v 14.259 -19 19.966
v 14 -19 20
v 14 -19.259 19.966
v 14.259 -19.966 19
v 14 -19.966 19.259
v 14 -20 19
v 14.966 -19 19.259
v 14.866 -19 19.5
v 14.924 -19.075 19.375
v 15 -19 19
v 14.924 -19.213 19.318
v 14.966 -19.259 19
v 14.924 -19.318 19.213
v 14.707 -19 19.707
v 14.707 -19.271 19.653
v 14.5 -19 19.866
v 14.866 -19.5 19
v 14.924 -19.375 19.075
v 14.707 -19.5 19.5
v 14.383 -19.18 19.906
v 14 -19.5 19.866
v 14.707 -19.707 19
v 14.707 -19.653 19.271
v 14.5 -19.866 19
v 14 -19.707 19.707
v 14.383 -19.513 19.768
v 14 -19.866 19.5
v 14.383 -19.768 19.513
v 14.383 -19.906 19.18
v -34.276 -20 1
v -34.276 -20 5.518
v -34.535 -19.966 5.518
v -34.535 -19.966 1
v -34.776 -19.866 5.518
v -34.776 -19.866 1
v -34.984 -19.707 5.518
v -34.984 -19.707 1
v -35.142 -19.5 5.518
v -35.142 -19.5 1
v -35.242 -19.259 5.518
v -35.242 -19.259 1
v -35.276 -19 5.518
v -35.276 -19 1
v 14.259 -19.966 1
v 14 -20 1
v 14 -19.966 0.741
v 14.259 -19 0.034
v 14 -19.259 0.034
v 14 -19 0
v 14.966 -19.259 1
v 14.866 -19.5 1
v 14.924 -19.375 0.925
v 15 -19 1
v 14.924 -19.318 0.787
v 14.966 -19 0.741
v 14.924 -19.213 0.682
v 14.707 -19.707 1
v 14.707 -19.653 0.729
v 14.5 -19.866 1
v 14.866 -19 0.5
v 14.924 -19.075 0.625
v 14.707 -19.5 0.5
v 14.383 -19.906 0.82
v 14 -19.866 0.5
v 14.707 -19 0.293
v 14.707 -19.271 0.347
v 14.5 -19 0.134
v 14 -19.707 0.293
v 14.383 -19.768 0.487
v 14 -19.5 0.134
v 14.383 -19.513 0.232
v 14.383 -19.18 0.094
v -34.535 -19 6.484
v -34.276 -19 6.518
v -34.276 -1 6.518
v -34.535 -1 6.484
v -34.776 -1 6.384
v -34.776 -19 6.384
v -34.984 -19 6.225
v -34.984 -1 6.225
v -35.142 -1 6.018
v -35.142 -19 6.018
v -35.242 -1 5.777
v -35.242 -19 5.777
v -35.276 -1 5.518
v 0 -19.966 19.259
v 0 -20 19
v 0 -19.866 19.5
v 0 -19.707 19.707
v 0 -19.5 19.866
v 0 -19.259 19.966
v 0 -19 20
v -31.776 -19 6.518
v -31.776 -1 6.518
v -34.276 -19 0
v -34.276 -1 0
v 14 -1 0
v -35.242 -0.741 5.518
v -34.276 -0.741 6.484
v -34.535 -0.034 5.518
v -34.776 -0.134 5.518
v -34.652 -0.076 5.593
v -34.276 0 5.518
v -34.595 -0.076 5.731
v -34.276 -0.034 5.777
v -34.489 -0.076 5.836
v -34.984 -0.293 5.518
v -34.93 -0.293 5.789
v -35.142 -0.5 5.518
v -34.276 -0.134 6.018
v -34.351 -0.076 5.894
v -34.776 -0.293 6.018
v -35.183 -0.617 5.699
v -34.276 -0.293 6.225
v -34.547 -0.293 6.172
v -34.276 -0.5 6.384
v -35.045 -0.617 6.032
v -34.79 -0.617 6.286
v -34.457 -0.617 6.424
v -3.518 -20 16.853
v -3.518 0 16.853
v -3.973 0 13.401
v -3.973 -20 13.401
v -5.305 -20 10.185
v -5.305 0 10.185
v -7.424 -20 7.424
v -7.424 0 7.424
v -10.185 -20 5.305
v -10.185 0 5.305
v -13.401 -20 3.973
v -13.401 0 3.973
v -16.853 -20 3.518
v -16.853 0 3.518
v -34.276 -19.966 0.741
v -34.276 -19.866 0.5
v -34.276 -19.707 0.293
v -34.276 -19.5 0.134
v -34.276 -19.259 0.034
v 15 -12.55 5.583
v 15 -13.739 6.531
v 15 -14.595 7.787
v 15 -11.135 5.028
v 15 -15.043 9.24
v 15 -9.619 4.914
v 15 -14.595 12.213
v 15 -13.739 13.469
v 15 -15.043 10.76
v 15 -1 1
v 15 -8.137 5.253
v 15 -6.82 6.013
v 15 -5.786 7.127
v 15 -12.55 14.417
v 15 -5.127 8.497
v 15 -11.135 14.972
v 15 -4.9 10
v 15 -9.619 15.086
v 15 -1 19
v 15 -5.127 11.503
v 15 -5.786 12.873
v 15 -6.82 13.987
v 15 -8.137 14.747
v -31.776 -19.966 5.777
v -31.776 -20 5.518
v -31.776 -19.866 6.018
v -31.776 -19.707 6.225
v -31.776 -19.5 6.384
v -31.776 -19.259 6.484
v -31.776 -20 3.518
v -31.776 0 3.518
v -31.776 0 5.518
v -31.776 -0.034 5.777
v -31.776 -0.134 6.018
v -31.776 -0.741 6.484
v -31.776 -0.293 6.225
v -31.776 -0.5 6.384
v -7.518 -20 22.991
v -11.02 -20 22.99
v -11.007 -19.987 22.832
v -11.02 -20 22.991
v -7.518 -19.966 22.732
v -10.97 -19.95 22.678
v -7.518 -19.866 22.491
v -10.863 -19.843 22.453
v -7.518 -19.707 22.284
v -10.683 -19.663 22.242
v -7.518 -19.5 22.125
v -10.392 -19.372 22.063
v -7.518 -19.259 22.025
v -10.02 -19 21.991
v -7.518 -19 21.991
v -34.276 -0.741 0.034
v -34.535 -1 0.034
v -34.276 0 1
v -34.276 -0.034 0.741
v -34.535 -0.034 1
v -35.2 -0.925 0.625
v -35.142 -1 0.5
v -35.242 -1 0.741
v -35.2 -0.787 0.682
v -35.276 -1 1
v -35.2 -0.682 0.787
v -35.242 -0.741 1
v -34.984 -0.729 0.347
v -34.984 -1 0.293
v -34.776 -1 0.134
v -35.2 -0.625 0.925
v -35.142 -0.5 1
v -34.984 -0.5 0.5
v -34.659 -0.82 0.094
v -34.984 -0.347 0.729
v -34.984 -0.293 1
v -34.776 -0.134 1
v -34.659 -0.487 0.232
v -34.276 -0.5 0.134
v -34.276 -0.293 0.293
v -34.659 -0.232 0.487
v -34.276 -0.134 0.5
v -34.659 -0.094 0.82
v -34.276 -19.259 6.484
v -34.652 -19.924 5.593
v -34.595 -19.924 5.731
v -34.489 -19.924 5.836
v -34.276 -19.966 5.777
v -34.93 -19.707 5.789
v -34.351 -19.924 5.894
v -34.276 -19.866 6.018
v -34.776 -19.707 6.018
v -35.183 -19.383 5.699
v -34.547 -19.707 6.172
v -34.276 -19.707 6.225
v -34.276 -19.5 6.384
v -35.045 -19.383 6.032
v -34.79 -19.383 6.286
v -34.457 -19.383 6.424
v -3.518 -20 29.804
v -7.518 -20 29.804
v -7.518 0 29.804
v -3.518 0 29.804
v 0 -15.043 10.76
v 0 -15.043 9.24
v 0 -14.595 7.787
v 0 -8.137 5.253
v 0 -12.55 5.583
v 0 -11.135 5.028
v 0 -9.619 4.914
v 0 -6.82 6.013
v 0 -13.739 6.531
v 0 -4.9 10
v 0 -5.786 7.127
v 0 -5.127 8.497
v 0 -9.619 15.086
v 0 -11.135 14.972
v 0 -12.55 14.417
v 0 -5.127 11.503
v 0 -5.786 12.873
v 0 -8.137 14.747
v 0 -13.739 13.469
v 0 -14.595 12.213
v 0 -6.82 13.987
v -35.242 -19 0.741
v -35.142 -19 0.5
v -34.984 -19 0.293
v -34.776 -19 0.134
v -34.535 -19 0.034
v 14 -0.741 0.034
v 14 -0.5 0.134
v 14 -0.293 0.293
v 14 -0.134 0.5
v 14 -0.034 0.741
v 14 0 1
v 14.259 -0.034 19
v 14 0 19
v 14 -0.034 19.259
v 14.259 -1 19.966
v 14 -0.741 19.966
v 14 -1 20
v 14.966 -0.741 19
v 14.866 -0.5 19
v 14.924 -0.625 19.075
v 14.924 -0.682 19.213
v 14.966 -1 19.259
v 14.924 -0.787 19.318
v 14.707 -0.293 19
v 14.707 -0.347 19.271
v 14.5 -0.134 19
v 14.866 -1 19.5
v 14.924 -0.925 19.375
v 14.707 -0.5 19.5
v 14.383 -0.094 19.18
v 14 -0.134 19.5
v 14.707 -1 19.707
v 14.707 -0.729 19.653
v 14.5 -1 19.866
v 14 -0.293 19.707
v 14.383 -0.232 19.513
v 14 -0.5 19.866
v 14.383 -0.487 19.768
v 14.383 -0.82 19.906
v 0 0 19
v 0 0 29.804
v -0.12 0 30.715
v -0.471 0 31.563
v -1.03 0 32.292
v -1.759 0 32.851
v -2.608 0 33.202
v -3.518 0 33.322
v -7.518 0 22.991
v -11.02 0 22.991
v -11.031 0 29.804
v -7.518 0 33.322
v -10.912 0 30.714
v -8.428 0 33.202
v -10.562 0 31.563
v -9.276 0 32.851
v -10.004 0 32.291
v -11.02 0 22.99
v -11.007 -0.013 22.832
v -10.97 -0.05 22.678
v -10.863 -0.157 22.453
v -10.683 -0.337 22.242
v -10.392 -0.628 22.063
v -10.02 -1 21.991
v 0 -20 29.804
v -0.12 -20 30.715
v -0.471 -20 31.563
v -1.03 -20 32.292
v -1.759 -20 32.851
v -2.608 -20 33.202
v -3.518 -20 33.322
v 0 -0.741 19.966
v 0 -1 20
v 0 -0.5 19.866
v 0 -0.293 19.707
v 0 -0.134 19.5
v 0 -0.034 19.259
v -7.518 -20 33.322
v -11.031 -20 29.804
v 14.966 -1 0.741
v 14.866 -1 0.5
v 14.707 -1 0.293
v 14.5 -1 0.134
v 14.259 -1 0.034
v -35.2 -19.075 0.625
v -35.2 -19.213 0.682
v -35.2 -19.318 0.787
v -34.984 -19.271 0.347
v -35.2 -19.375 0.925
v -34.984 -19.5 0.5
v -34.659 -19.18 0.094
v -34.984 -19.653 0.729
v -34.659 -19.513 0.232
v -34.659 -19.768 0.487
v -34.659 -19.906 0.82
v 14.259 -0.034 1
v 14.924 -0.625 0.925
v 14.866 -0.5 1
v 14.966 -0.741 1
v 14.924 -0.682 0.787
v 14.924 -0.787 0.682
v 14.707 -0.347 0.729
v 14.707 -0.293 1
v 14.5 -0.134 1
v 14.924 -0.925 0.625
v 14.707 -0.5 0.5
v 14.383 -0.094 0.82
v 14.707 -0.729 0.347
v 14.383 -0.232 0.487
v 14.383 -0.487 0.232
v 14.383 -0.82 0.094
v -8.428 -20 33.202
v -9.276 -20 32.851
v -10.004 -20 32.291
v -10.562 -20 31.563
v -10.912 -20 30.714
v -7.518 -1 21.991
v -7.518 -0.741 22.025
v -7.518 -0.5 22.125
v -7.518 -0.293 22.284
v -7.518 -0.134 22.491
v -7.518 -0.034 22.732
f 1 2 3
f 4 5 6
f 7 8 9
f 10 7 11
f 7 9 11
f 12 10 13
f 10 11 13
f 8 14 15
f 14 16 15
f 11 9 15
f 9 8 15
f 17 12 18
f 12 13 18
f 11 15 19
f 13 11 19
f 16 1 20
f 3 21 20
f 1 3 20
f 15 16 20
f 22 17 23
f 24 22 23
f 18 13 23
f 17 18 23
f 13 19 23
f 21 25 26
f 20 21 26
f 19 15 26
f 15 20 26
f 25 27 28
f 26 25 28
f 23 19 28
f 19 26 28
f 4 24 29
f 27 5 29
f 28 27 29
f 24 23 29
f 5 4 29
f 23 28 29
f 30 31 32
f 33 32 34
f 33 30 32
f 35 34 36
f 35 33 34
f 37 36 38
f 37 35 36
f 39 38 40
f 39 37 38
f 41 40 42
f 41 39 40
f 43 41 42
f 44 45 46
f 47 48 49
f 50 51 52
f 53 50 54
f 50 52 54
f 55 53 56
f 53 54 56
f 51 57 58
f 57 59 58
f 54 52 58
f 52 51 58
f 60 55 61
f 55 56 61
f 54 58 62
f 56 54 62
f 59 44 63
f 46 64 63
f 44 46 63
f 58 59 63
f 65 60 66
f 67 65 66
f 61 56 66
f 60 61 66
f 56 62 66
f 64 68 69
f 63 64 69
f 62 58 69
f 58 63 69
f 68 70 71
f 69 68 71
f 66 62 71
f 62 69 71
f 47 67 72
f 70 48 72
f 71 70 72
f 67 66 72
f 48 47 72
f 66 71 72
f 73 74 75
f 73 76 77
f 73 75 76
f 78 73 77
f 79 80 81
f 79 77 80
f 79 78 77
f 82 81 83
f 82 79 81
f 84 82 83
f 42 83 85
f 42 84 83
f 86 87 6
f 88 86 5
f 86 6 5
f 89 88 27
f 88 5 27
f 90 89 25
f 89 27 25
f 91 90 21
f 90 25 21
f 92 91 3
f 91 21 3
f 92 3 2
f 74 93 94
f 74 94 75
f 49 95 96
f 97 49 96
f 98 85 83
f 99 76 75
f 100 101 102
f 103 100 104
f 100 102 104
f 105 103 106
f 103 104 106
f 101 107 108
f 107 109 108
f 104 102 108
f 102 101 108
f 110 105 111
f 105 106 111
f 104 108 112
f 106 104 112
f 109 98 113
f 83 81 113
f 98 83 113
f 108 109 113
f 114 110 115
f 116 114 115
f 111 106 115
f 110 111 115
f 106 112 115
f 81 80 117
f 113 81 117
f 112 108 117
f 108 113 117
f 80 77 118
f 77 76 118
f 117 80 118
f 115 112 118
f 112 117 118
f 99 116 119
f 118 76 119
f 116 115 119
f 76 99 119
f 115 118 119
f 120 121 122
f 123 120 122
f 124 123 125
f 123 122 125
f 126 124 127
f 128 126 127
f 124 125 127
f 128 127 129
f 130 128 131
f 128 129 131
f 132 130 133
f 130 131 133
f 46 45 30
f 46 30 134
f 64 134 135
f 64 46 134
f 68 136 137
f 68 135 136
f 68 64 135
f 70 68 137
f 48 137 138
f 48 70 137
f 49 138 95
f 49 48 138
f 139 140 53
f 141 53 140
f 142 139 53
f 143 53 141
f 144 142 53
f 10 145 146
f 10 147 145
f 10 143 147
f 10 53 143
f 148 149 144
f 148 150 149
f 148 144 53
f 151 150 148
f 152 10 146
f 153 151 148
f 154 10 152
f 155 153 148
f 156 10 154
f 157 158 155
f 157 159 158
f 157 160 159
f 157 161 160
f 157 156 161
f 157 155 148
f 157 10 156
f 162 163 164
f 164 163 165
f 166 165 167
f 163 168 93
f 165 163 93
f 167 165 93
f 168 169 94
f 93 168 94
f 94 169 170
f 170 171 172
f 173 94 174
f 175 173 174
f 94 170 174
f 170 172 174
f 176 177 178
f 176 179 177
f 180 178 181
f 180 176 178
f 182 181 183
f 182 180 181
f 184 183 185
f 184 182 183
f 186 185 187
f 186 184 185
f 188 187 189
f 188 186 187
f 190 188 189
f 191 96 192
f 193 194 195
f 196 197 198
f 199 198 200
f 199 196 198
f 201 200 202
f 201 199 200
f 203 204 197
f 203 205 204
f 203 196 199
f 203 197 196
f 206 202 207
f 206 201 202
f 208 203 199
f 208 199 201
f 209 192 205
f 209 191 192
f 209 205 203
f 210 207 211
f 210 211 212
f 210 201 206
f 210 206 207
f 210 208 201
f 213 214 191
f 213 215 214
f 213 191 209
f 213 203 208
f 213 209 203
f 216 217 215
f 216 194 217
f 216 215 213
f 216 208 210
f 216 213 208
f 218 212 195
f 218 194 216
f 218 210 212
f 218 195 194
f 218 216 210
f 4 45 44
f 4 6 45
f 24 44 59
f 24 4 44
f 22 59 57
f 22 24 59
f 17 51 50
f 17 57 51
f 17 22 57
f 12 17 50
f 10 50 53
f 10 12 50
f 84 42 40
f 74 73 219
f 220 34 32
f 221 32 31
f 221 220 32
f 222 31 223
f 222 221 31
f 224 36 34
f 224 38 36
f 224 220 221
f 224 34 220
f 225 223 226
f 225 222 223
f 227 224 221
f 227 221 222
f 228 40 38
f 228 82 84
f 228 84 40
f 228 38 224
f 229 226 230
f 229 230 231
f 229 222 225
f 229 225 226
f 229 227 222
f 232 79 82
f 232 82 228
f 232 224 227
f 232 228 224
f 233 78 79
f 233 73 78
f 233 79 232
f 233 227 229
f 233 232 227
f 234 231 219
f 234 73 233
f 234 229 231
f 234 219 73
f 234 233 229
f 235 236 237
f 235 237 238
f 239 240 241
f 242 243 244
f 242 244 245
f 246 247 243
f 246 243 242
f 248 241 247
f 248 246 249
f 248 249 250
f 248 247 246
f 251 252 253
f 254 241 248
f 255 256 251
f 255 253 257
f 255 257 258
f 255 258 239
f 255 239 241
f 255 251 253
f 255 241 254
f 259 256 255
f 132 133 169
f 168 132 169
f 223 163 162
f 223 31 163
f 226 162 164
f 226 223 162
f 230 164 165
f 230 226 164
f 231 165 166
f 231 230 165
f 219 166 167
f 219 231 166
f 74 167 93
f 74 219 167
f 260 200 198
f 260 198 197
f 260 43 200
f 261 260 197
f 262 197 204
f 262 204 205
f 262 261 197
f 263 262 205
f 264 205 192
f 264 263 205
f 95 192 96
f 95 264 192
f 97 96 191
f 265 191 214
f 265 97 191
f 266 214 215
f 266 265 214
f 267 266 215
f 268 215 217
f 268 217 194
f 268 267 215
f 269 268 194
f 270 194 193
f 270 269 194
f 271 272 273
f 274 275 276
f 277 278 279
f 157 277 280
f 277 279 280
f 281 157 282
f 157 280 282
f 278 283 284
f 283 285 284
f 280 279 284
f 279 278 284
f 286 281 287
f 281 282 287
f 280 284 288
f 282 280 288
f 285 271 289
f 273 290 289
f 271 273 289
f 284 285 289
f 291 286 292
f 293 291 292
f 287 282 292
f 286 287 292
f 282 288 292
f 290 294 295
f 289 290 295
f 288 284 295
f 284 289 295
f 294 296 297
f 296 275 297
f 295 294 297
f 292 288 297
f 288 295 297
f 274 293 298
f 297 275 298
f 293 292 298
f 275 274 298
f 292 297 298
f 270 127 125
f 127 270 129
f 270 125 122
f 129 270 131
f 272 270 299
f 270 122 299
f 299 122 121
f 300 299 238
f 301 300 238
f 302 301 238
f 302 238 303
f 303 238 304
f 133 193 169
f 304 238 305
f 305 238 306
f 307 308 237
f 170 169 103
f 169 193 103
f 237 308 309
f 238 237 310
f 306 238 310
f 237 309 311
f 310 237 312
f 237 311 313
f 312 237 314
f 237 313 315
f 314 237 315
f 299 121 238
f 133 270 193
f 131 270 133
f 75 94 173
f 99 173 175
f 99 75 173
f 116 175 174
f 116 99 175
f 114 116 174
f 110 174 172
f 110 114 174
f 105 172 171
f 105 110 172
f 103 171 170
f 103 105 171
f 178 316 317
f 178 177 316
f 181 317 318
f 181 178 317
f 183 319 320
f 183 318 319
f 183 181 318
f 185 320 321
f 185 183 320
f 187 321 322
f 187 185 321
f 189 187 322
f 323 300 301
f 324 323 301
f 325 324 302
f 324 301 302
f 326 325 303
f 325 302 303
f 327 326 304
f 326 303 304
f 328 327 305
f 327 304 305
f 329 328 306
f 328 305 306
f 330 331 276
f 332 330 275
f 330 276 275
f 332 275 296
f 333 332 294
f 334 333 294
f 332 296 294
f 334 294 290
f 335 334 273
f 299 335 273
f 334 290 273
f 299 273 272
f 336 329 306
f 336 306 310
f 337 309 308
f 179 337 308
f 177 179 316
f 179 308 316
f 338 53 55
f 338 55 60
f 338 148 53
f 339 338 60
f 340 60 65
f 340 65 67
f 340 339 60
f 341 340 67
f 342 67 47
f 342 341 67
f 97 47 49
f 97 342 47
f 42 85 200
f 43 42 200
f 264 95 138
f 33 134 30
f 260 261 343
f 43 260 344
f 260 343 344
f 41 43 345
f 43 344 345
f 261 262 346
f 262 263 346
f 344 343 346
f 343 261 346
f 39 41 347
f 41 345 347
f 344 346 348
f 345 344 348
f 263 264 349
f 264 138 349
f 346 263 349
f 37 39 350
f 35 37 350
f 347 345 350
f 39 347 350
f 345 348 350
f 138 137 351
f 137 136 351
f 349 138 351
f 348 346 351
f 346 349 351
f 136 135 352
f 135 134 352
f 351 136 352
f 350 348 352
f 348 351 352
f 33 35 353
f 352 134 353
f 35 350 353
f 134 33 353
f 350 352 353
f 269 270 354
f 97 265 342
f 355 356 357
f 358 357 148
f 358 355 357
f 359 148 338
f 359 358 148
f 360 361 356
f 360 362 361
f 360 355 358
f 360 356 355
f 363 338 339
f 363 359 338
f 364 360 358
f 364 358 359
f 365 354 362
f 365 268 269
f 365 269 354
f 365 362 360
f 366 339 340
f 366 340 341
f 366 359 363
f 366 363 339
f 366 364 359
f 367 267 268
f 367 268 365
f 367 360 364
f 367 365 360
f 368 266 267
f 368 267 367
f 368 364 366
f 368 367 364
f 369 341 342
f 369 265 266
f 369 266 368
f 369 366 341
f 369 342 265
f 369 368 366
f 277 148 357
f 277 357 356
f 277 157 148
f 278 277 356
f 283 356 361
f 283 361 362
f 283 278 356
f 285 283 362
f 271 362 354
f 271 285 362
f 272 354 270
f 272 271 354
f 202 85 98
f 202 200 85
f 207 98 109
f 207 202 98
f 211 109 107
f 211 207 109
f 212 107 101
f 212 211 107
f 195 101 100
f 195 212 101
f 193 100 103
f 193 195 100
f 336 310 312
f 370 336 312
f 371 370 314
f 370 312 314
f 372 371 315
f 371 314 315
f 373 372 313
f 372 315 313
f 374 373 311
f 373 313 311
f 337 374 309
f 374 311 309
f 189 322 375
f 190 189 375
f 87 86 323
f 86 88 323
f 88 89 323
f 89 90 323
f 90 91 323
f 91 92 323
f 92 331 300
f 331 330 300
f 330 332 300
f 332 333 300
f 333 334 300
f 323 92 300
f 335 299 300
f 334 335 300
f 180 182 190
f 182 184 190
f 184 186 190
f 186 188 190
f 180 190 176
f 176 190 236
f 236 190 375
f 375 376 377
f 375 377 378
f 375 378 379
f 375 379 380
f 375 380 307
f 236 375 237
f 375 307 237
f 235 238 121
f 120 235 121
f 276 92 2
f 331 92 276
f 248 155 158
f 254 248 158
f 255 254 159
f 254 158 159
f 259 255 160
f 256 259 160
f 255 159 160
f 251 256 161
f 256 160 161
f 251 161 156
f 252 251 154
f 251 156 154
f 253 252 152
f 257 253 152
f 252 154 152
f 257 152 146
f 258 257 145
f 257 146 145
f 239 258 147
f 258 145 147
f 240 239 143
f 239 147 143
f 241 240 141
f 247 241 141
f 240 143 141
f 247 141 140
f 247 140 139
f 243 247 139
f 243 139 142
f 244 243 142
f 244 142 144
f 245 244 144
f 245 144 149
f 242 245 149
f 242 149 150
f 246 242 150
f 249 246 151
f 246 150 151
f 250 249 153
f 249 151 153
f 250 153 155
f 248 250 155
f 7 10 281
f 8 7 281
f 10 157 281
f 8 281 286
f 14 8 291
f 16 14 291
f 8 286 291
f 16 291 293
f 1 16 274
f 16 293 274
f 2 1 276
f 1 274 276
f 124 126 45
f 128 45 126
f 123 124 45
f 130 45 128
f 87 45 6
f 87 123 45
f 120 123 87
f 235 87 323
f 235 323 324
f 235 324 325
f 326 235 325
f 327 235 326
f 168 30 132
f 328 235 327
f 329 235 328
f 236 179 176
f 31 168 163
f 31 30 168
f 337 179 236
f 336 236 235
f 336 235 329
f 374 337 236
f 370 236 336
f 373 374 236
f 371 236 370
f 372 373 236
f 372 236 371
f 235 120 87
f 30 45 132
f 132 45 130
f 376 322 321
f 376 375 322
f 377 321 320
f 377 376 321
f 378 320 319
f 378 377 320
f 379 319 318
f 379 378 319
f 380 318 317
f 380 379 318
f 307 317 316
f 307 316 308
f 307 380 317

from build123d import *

# Parameters (mm, degrees)
F1_DEPTH = 20
F2_DEPTH = 20
F3_W     = 20
F3_H     = 20
F4_DEPTH = 15
F5_R     = 5.1
F6_DEPTH = 15
F7_R     = 1


# Not quite as in the source:
# - a feature names something its author has since deleted; it is built from what else it names


with BuildPart() as f1:
    # F0 (on Front) → F1 (new body)
    with BuildSketch(Plane.XZ):
        with BuildLine():
            Line((-11.0182737141, 21.9913642435), (-7.5182737801, 21.9906845019))
            Line((-7.5182737801, 21.9906845019), (-7.5182737801, 29.8039734362))
            Line((-7.5182737801, 29.8039734362), (-3.5182737801, 29.8039734362))
            Line((-3.5182737801, 29.8039734362), (-3.5182737801, 16.8525947745))
            ThreePointArc((-3.5182737801, 16.8525947745), (-7.4238059768, 7.4238059768), (-16.8525947745, 3.5182737801))
            Line((-16.8525947745, 3.5182737801), (-31.7764421987, 3.5182737801))
            Line((-31.7764421987, 3.5182737801), (-31.7764421987, 6.5182737801))
            Line((-31.7764421987, 6.5182737801), (-35.2764421987, 6.5182737801))
            Line((-35.2764421987, 6.5182737801), (-35.2764421987, 0))
            Line((-35.2764421987, 0), (-16.8525947745, 0))
            ThreePointArc((-16.8525947745, 0), (-4.9360107289, 4.9360107289), (0, 16.8525947745))
            Line((0, 16.8525947745), (0, 29.8039734362))
            ThreePointArc((0, 29.8039734362), (-1.0304785321, 32.2917686842), (-3.5182737801, 33.3222472163))
            Line((-3.5182737801, 33.3222472163), (-7.5182737801, 33.3222472163))
            ThreePointArc((-7.5182737801, 33.3222472163), (-10.0040648606, 32.2914241533), (-11.0308766315, 29.8039734362))
            Line((-11.0308766315, 29.8039734362), (-11.0182737141, 21.9913642435))
        make_face()
    extrude(amount=F1_DEPTH)

    # F0 (on Front) → F2 (join)
    with BuildSketch(Plane.XZ):
        with BuildLine():
            Line((0, 0), (0, 16.8525947745))
            ThreePointArc((0, 16.8525947745), (-4.9360107289, 4.9360107289), (-16.8525947745, 0))
            Line((-16.8525947745, 0), (0, 0))
        make_face()
    extrude(amount=F2_DEPTH)

    # F3 (on face) → F4 (join)
    with BuildSketch(Plane.YZ):
        with Locations((-10, 10)):
            Rectangle(F3_W, F3_H)
    extrude(amount=F4_DEPTH)

    # F5 (on face) → F6 (cut)
    with BuildSketch(Plane.YZ.offset(15)):
        with Locations((-10, 10)):
            Circle(F5_R)
    extrude(amount=-F6_DEPTH, mode=Mode.SUBTRACT)

    # F7
    f7_edges = [f1.edges().sort_by_distance(p)[0] for p in [
        (-10.138221, -20, 0),
        (-10.138221, 0, 0),
        (-35.276442, -10, 0),
        (-35.276442, -10, 6.518274),
        (-35.276442, 0, 3.259137),
        (-35.276442, -20, 3.259137),
        (-33.526442, -20, 6.518274),
        (-33.526442, 0, 6.518274),
        (-9.268274, 0, 21.991024),
        (-9.268274, -20, 21.991024),
        (-11.018274, -10, 21.991364),
        (7.5, 0, 20),
        (7.5, -20, 20),
        (15, 0, 10),
        (15, -10, 20),
        (15, -20, 10),
        (15, -10, 0),
    ]]
    fillet(f7_edges, radius=F7_R)


solid = f1.part
